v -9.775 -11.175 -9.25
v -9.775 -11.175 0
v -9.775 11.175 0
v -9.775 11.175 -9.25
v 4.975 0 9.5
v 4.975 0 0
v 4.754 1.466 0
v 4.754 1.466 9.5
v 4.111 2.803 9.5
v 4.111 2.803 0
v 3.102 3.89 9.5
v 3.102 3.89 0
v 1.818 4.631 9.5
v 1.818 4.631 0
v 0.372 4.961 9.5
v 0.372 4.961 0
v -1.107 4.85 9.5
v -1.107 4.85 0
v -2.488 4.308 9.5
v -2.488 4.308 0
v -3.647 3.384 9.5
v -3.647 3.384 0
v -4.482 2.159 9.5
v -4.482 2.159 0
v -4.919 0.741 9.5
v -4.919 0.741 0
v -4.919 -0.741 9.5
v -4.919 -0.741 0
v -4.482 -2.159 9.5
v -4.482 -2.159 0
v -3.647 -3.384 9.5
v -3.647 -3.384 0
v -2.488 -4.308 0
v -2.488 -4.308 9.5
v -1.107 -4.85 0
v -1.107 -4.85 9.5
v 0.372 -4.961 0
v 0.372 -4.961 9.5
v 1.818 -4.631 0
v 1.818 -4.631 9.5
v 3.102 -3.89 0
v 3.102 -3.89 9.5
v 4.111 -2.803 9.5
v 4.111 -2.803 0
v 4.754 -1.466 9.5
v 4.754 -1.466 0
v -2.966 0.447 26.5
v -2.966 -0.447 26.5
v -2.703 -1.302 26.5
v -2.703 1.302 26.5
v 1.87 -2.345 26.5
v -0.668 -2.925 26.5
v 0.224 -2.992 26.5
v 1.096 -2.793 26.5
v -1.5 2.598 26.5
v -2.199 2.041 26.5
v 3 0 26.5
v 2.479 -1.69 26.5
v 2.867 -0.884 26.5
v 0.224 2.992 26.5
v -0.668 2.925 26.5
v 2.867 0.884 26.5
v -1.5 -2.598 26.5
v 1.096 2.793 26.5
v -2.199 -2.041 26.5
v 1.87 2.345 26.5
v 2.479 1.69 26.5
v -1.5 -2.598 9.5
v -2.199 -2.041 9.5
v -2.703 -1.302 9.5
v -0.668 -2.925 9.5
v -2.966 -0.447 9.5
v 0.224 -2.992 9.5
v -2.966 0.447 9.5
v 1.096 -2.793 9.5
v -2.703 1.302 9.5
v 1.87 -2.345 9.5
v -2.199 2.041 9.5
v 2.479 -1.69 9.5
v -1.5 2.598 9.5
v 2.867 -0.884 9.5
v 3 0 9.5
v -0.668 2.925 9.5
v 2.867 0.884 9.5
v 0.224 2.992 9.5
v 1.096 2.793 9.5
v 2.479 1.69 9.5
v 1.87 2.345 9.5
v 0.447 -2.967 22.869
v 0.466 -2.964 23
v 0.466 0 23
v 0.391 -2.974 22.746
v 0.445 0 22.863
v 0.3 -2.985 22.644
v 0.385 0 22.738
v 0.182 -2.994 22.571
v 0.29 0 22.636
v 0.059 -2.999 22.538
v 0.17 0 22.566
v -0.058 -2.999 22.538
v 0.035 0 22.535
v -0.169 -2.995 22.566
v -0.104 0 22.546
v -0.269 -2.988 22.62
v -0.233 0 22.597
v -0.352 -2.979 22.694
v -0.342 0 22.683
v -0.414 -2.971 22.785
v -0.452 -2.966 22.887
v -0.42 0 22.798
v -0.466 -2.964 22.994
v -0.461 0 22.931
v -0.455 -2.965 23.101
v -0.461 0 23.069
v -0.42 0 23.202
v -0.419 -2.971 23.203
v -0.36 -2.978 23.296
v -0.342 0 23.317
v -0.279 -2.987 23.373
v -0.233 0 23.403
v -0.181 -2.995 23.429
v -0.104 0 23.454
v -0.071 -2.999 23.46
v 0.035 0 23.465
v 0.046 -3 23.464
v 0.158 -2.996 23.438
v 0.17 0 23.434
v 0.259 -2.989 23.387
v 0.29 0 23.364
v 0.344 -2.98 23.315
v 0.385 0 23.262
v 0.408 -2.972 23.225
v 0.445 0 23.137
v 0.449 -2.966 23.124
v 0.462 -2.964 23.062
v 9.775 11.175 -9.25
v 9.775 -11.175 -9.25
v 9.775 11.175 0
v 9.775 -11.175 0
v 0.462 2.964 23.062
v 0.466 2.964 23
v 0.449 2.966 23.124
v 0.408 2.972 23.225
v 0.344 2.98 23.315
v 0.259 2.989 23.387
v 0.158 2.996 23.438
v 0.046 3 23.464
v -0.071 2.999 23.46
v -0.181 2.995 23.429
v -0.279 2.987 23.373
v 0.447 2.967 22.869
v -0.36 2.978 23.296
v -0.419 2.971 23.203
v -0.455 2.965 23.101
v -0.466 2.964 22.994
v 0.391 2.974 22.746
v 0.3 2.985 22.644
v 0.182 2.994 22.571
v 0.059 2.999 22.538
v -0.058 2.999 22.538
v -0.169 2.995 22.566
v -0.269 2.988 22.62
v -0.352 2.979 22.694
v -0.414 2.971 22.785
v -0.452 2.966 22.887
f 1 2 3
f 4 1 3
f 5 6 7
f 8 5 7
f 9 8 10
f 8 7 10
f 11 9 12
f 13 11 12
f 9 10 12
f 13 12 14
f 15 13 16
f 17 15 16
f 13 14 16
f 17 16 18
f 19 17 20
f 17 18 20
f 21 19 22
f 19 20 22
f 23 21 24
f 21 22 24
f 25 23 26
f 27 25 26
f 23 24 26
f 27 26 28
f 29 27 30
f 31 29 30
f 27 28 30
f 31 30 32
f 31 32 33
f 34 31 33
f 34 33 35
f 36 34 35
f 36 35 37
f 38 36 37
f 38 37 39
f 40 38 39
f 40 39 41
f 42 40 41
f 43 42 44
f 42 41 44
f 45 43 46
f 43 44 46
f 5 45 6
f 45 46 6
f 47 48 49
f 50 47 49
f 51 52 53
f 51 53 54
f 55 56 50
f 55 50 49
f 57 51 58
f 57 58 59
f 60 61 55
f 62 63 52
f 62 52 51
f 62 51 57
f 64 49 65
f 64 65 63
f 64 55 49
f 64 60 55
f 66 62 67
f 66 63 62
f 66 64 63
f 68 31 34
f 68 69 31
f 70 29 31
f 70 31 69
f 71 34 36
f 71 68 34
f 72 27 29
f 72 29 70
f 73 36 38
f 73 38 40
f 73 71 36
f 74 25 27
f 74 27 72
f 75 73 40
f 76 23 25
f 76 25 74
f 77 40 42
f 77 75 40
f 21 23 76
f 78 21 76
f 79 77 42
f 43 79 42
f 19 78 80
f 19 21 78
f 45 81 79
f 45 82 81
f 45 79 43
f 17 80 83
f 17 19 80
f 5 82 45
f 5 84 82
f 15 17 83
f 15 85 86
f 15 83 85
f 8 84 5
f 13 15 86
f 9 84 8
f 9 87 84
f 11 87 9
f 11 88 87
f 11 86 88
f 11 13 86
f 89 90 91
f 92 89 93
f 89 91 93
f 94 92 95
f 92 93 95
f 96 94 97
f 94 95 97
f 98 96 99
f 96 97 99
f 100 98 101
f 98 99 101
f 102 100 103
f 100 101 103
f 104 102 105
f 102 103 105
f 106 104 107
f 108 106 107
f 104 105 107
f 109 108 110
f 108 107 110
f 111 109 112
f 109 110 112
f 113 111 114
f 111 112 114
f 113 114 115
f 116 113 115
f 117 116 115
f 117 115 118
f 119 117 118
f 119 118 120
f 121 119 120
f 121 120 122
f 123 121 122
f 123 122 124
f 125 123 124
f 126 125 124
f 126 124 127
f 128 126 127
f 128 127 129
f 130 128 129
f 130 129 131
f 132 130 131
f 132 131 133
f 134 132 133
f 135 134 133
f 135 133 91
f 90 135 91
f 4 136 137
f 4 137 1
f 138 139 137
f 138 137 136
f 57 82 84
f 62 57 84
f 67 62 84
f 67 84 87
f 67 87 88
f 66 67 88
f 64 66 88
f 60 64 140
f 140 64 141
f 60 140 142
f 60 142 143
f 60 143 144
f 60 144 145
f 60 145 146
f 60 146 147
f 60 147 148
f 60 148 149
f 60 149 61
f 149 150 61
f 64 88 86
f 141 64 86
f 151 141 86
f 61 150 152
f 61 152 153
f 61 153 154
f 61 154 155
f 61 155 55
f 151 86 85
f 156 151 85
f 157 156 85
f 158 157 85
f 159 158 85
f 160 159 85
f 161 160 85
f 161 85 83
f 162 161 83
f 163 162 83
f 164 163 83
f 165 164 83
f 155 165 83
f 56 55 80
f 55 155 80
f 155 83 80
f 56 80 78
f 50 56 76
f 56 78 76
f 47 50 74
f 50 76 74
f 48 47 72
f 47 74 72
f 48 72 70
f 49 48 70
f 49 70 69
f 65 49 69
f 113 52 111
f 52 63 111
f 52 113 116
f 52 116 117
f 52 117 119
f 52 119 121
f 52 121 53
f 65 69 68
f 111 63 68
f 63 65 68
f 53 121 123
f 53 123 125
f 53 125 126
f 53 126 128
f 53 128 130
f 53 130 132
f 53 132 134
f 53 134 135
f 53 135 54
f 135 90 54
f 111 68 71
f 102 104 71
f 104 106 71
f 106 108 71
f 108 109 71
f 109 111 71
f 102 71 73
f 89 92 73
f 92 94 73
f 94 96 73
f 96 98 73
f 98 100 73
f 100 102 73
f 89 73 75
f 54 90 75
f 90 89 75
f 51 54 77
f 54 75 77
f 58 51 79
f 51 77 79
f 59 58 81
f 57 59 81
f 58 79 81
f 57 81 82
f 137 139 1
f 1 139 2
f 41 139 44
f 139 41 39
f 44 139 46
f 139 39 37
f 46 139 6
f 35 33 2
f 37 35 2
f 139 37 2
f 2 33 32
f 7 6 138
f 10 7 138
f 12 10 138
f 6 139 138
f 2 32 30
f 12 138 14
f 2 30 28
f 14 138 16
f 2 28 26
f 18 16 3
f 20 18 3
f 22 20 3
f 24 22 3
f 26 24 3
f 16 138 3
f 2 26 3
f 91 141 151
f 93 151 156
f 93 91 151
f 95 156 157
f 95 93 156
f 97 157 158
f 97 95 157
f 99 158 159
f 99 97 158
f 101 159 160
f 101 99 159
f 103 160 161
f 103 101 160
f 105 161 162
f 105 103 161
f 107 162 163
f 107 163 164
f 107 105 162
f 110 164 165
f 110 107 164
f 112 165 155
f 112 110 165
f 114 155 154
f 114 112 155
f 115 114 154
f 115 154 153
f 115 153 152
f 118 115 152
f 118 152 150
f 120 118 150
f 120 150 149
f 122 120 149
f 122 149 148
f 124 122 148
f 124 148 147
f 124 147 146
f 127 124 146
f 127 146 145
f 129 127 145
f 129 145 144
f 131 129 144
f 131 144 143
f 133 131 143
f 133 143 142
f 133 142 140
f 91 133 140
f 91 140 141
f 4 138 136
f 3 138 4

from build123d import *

# Parameters (mm, degrees)
SKETCH1_R                      = 4.975
BOSS_EXTRUDE1_DEPTH            = 9.5
SKETCH2_R                      = 3
BOSS_EXTRUDE2_DEPTH            = 17
CUT_EXTRUDE1_REACH             = 6.975
SKETCH3_R                      = 0.465864979
CUT_EXTRUDE1_DIRECTION_2_REACH = 6.975
SKETCH5_W                      = 19.55
SKETCH5_H                      = 22.35
BOSS_EXTRUDE4_DEPTH            = 9.25


with BuildPart() as part:
    # Sketch1 → Boss-Extrude1 (new body)
    with BuildSketch(Plane.XY):
        Circle(SKETCH1_R)
    extrude(amount=BOSS_EXTRUDE1_DEPTH)

    # Sketch2 → Boss-Extrude2 (add)
    with BuildSketch(Plane.XY.offset(9.5)):
        Circle(SKETCH2_R)
    extrude(amount=BOSS_EXTRUDE2_DEPTH)

    # Sketch3 → Cut-Extrude1 (cut, up to next)
    with BuildSketch(Plane(origin=(0, 0, 0), x_dir=(1, 0, 0), z_dir=(0, 1, 0)), mode=Mode.PRIVATE) as cut_extrude1_sk1:
        with Locations((0, -23)):
            Circle(SKETCH3_R)
    cut_extrude1_tool1 = extrude(cut_extrude1_sk1.sketch, amount=-CUT_EXTRUDE1_REACH, mode=Mode.PRIVATE) & part.part
    add(cut_extrude1_tool1.solids().sort_by_distance((0, 0, 23))[0], mode=Mode.SUBTRACT)

    # Sketch3 → Cut-Extrude1 direction 2 (cut, up to next)
    with BuildSketch(Plane(origin=(0, 0, 0), x_dir=(1, 0, 0), z_dir=(0, 1, 0)), mode=Mode.PRIVATE) as cut_extrude1_direction_2_sk1:
        with Locations((0, -23)):
            Circle(SKETCH3_R)
    cut_extrude1_direction_2_tool1 = extrude(cut_extrude1_direction_2_sk1.sketch, amount=CUT_EXTRUDE1_DIRECTION_2_REACH, mode=Mode.PRIVATE) & part.part
    add(cut_extrude1_direction_2_tool1.solids().sort_by_distance((0, 0, 23))[0], mode=Mode.SUBTRACT)

    # Sketch5 → Boss-Extrude4 (add)
    with BuildSketch(Plane(origin=(0, 0, 0), x_dir=(-1, 0, 0), z_dir=(0, 0, -1))):
        Rectangle(SKETCH5_W, SKETCH5_H)
    extrude(amount=BOSS_EXTRUDE4_DEPTH)


solid = part.part
